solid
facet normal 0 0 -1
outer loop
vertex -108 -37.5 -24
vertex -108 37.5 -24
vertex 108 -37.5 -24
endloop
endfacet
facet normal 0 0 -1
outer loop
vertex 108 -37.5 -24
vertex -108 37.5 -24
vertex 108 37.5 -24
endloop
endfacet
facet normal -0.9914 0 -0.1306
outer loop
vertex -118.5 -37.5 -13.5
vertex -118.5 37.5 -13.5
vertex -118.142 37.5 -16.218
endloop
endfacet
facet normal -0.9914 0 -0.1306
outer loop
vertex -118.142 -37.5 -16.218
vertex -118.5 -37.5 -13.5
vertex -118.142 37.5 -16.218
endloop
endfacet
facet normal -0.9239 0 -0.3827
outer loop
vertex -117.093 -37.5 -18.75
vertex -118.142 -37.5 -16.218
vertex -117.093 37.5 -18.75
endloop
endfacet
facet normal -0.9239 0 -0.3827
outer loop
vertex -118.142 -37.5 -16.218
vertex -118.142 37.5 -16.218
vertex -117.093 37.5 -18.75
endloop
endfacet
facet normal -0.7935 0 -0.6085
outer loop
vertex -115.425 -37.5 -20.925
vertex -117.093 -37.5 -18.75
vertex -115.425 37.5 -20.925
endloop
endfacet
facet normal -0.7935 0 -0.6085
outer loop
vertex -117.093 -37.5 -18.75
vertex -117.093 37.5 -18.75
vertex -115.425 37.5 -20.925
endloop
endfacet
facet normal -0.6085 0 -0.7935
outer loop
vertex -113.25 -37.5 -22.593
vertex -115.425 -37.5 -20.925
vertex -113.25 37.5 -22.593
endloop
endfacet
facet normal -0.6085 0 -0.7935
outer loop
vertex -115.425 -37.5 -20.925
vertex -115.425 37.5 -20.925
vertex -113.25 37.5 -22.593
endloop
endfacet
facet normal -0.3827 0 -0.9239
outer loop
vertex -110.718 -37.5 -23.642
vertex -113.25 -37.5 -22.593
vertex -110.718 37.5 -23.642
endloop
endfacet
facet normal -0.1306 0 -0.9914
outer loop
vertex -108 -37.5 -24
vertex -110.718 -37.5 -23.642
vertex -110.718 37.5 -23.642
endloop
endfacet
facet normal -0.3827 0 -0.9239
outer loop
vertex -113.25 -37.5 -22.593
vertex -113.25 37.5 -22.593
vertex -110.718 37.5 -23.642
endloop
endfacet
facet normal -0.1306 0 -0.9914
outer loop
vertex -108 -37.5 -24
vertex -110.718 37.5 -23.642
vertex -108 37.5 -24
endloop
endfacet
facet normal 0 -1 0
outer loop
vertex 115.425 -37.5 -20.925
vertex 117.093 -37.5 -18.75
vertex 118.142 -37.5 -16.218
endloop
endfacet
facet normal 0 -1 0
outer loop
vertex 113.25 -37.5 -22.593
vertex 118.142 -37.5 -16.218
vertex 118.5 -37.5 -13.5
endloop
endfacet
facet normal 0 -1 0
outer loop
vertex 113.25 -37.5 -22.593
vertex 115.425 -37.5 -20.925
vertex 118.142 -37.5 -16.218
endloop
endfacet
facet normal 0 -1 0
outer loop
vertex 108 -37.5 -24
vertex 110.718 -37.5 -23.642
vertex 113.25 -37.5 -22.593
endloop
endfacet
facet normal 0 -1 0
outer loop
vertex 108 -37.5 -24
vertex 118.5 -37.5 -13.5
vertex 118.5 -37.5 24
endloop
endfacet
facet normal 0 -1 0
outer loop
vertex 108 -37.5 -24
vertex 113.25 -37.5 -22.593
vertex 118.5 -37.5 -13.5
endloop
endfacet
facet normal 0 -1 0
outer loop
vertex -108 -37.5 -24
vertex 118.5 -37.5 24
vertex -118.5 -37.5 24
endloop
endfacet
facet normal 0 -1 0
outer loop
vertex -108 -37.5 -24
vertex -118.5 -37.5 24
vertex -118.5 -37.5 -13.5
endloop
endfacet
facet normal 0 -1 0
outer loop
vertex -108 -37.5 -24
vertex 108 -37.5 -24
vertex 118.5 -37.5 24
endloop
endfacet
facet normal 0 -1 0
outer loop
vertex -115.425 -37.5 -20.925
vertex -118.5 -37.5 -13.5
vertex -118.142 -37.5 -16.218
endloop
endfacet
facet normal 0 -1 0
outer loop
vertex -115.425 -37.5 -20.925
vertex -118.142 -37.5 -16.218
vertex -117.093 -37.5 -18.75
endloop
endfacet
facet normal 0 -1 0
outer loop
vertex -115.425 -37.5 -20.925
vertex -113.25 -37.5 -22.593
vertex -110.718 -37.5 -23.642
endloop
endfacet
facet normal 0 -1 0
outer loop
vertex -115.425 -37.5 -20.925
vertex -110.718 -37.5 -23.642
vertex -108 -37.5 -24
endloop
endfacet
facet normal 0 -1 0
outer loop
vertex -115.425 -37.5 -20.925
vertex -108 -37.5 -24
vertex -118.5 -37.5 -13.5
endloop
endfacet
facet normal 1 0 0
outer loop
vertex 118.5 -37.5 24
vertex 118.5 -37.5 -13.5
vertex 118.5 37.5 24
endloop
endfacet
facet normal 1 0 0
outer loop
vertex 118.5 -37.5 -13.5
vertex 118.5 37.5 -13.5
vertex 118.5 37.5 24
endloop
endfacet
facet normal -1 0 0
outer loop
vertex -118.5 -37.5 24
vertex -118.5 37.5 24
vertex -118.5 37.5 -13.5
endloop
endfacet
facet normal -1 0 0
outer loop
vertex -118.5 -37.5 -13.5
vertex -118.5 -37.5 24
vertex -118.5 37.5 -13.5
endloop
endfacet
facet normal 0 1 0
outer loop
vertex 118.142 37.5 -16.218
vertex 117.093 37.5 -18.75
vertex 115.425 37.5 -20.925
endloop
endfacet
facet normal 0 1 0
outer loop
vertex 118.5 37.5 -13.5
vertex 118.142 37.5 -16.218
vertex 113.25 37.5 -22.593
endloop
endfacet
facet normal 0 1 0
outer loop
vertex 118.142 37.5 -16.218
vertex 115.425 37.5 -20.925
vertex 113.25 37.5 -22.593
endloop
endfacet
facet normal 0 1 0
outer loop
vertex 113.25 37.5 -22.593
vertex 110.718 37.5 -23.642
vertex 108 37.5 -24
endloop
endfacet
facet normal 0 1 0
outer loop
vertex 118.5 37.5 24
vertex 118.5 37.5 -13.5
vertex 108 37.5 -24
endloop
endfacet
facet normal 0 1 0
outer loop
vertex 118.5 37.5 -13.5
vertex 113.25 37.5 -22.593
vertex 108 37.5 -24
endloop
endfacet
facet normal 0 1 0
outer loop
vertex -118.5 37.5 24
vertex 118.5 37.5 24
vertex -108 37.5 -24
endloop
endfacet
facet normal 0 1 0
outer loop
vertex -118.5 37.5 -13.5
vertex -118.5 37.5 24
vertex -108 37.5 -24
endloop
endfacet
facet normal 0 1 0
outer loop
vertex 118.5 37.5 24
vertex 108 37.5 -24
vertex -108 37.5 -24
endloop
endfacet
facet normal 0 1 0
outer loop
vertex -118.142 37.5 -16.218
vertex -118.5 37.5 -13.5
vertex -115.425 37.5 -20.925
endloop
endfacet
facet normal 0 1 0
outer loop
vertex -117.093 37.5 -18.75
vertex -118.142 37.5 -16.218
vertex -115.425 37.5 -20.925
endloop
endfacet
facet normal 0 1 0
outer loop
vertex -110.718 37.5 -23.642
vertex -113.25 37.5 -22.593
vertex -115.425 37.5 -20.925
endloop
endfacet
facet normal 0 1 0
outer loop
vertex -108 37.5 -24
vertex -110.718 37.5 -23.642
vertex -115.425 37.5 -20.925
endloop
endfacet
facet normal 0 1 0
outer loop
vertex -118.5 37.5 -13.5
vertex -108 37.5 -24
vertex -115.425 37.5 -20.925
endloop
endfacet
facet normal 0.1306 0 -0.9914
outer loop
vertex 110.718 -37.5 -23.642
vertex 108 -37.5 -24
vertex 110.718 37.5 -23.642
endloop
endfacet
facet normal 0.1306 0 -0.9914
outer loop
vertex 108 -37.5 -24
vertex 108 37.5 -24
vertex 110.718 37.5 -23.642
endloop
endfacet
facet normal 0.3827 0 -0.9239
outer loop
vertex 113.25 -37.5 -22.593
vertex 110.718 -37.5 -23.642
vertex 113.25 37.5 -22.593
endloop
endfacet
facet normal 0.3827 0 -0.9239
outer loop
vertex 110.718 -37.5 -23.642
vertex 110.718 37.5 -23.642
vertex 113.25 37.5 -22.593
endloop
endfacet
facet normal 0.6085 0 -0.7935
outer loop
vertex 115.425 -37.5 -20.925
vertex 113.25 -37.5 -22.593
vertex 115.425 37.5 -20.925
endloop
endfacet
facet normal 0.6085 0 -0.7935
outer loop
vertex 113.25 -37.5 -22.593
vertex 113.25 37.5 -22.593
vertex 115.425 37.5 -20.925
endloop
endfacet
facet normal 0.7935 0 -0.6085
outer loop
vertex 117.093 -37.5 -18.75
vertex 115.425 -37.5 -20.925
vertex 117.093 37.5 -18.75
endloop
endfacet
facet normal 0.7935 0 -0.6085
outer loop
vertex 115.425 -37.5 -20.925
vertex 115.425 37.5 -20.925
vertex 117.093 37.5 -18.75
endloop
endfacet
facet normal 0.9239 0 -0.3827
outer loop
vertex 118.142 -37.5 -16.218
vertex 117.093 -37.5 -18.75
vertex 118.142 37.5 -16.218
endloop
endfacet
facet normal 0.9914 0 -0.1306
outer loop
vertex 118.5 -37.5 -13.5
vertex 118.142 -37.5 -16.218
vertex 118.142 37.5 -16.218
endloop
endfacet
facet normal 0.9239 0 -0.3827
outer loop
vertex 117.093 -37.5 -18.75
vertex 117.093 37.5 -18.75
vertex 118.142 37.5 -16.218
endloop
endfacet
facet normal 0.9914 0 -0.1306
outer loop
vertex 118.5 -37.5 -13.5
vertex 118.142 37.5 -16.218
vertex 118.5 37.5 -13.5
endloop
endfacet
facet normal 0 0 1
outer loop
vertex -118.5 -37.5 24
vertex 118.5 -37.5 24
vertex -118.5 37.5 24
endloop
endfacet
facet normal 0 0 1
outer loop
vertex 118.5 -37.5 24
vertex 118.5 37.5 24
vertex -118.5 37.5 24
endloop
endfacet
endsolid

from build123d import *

# Parameters (mm, degrees)
BOSS_EXTRUDE1_DEPTH = 37.5


with BuildPart() as part:
    # Sketch1 → Boss-Extrude1 (new, symmetric)
    with BuildSketch(Plane(origin=(0, 0, 0), x_dir=(1, 0, 0), z_dir=(0, 1, 0))):
        with BuildLine():
            Line((-108, 24), (108, 24))
            ThreePointArc((108, 24), (115.424621202, 20.924621202), (118.5, 13.5))
            Line((118.5, 13.5), (118.5, -24))
            Line((118.5, -24), (-118.5, -24))
            Line((-118.5, -24), (-118.5, 13.5))
            ThreePointArc((-118.5, 13.5), (-115.424621202, 20.924621202), (-108, 24))
        make_face()
    extrude(amount=BOSS_EXTRUDE1_DEPTH, both=True)


solid = part.part
